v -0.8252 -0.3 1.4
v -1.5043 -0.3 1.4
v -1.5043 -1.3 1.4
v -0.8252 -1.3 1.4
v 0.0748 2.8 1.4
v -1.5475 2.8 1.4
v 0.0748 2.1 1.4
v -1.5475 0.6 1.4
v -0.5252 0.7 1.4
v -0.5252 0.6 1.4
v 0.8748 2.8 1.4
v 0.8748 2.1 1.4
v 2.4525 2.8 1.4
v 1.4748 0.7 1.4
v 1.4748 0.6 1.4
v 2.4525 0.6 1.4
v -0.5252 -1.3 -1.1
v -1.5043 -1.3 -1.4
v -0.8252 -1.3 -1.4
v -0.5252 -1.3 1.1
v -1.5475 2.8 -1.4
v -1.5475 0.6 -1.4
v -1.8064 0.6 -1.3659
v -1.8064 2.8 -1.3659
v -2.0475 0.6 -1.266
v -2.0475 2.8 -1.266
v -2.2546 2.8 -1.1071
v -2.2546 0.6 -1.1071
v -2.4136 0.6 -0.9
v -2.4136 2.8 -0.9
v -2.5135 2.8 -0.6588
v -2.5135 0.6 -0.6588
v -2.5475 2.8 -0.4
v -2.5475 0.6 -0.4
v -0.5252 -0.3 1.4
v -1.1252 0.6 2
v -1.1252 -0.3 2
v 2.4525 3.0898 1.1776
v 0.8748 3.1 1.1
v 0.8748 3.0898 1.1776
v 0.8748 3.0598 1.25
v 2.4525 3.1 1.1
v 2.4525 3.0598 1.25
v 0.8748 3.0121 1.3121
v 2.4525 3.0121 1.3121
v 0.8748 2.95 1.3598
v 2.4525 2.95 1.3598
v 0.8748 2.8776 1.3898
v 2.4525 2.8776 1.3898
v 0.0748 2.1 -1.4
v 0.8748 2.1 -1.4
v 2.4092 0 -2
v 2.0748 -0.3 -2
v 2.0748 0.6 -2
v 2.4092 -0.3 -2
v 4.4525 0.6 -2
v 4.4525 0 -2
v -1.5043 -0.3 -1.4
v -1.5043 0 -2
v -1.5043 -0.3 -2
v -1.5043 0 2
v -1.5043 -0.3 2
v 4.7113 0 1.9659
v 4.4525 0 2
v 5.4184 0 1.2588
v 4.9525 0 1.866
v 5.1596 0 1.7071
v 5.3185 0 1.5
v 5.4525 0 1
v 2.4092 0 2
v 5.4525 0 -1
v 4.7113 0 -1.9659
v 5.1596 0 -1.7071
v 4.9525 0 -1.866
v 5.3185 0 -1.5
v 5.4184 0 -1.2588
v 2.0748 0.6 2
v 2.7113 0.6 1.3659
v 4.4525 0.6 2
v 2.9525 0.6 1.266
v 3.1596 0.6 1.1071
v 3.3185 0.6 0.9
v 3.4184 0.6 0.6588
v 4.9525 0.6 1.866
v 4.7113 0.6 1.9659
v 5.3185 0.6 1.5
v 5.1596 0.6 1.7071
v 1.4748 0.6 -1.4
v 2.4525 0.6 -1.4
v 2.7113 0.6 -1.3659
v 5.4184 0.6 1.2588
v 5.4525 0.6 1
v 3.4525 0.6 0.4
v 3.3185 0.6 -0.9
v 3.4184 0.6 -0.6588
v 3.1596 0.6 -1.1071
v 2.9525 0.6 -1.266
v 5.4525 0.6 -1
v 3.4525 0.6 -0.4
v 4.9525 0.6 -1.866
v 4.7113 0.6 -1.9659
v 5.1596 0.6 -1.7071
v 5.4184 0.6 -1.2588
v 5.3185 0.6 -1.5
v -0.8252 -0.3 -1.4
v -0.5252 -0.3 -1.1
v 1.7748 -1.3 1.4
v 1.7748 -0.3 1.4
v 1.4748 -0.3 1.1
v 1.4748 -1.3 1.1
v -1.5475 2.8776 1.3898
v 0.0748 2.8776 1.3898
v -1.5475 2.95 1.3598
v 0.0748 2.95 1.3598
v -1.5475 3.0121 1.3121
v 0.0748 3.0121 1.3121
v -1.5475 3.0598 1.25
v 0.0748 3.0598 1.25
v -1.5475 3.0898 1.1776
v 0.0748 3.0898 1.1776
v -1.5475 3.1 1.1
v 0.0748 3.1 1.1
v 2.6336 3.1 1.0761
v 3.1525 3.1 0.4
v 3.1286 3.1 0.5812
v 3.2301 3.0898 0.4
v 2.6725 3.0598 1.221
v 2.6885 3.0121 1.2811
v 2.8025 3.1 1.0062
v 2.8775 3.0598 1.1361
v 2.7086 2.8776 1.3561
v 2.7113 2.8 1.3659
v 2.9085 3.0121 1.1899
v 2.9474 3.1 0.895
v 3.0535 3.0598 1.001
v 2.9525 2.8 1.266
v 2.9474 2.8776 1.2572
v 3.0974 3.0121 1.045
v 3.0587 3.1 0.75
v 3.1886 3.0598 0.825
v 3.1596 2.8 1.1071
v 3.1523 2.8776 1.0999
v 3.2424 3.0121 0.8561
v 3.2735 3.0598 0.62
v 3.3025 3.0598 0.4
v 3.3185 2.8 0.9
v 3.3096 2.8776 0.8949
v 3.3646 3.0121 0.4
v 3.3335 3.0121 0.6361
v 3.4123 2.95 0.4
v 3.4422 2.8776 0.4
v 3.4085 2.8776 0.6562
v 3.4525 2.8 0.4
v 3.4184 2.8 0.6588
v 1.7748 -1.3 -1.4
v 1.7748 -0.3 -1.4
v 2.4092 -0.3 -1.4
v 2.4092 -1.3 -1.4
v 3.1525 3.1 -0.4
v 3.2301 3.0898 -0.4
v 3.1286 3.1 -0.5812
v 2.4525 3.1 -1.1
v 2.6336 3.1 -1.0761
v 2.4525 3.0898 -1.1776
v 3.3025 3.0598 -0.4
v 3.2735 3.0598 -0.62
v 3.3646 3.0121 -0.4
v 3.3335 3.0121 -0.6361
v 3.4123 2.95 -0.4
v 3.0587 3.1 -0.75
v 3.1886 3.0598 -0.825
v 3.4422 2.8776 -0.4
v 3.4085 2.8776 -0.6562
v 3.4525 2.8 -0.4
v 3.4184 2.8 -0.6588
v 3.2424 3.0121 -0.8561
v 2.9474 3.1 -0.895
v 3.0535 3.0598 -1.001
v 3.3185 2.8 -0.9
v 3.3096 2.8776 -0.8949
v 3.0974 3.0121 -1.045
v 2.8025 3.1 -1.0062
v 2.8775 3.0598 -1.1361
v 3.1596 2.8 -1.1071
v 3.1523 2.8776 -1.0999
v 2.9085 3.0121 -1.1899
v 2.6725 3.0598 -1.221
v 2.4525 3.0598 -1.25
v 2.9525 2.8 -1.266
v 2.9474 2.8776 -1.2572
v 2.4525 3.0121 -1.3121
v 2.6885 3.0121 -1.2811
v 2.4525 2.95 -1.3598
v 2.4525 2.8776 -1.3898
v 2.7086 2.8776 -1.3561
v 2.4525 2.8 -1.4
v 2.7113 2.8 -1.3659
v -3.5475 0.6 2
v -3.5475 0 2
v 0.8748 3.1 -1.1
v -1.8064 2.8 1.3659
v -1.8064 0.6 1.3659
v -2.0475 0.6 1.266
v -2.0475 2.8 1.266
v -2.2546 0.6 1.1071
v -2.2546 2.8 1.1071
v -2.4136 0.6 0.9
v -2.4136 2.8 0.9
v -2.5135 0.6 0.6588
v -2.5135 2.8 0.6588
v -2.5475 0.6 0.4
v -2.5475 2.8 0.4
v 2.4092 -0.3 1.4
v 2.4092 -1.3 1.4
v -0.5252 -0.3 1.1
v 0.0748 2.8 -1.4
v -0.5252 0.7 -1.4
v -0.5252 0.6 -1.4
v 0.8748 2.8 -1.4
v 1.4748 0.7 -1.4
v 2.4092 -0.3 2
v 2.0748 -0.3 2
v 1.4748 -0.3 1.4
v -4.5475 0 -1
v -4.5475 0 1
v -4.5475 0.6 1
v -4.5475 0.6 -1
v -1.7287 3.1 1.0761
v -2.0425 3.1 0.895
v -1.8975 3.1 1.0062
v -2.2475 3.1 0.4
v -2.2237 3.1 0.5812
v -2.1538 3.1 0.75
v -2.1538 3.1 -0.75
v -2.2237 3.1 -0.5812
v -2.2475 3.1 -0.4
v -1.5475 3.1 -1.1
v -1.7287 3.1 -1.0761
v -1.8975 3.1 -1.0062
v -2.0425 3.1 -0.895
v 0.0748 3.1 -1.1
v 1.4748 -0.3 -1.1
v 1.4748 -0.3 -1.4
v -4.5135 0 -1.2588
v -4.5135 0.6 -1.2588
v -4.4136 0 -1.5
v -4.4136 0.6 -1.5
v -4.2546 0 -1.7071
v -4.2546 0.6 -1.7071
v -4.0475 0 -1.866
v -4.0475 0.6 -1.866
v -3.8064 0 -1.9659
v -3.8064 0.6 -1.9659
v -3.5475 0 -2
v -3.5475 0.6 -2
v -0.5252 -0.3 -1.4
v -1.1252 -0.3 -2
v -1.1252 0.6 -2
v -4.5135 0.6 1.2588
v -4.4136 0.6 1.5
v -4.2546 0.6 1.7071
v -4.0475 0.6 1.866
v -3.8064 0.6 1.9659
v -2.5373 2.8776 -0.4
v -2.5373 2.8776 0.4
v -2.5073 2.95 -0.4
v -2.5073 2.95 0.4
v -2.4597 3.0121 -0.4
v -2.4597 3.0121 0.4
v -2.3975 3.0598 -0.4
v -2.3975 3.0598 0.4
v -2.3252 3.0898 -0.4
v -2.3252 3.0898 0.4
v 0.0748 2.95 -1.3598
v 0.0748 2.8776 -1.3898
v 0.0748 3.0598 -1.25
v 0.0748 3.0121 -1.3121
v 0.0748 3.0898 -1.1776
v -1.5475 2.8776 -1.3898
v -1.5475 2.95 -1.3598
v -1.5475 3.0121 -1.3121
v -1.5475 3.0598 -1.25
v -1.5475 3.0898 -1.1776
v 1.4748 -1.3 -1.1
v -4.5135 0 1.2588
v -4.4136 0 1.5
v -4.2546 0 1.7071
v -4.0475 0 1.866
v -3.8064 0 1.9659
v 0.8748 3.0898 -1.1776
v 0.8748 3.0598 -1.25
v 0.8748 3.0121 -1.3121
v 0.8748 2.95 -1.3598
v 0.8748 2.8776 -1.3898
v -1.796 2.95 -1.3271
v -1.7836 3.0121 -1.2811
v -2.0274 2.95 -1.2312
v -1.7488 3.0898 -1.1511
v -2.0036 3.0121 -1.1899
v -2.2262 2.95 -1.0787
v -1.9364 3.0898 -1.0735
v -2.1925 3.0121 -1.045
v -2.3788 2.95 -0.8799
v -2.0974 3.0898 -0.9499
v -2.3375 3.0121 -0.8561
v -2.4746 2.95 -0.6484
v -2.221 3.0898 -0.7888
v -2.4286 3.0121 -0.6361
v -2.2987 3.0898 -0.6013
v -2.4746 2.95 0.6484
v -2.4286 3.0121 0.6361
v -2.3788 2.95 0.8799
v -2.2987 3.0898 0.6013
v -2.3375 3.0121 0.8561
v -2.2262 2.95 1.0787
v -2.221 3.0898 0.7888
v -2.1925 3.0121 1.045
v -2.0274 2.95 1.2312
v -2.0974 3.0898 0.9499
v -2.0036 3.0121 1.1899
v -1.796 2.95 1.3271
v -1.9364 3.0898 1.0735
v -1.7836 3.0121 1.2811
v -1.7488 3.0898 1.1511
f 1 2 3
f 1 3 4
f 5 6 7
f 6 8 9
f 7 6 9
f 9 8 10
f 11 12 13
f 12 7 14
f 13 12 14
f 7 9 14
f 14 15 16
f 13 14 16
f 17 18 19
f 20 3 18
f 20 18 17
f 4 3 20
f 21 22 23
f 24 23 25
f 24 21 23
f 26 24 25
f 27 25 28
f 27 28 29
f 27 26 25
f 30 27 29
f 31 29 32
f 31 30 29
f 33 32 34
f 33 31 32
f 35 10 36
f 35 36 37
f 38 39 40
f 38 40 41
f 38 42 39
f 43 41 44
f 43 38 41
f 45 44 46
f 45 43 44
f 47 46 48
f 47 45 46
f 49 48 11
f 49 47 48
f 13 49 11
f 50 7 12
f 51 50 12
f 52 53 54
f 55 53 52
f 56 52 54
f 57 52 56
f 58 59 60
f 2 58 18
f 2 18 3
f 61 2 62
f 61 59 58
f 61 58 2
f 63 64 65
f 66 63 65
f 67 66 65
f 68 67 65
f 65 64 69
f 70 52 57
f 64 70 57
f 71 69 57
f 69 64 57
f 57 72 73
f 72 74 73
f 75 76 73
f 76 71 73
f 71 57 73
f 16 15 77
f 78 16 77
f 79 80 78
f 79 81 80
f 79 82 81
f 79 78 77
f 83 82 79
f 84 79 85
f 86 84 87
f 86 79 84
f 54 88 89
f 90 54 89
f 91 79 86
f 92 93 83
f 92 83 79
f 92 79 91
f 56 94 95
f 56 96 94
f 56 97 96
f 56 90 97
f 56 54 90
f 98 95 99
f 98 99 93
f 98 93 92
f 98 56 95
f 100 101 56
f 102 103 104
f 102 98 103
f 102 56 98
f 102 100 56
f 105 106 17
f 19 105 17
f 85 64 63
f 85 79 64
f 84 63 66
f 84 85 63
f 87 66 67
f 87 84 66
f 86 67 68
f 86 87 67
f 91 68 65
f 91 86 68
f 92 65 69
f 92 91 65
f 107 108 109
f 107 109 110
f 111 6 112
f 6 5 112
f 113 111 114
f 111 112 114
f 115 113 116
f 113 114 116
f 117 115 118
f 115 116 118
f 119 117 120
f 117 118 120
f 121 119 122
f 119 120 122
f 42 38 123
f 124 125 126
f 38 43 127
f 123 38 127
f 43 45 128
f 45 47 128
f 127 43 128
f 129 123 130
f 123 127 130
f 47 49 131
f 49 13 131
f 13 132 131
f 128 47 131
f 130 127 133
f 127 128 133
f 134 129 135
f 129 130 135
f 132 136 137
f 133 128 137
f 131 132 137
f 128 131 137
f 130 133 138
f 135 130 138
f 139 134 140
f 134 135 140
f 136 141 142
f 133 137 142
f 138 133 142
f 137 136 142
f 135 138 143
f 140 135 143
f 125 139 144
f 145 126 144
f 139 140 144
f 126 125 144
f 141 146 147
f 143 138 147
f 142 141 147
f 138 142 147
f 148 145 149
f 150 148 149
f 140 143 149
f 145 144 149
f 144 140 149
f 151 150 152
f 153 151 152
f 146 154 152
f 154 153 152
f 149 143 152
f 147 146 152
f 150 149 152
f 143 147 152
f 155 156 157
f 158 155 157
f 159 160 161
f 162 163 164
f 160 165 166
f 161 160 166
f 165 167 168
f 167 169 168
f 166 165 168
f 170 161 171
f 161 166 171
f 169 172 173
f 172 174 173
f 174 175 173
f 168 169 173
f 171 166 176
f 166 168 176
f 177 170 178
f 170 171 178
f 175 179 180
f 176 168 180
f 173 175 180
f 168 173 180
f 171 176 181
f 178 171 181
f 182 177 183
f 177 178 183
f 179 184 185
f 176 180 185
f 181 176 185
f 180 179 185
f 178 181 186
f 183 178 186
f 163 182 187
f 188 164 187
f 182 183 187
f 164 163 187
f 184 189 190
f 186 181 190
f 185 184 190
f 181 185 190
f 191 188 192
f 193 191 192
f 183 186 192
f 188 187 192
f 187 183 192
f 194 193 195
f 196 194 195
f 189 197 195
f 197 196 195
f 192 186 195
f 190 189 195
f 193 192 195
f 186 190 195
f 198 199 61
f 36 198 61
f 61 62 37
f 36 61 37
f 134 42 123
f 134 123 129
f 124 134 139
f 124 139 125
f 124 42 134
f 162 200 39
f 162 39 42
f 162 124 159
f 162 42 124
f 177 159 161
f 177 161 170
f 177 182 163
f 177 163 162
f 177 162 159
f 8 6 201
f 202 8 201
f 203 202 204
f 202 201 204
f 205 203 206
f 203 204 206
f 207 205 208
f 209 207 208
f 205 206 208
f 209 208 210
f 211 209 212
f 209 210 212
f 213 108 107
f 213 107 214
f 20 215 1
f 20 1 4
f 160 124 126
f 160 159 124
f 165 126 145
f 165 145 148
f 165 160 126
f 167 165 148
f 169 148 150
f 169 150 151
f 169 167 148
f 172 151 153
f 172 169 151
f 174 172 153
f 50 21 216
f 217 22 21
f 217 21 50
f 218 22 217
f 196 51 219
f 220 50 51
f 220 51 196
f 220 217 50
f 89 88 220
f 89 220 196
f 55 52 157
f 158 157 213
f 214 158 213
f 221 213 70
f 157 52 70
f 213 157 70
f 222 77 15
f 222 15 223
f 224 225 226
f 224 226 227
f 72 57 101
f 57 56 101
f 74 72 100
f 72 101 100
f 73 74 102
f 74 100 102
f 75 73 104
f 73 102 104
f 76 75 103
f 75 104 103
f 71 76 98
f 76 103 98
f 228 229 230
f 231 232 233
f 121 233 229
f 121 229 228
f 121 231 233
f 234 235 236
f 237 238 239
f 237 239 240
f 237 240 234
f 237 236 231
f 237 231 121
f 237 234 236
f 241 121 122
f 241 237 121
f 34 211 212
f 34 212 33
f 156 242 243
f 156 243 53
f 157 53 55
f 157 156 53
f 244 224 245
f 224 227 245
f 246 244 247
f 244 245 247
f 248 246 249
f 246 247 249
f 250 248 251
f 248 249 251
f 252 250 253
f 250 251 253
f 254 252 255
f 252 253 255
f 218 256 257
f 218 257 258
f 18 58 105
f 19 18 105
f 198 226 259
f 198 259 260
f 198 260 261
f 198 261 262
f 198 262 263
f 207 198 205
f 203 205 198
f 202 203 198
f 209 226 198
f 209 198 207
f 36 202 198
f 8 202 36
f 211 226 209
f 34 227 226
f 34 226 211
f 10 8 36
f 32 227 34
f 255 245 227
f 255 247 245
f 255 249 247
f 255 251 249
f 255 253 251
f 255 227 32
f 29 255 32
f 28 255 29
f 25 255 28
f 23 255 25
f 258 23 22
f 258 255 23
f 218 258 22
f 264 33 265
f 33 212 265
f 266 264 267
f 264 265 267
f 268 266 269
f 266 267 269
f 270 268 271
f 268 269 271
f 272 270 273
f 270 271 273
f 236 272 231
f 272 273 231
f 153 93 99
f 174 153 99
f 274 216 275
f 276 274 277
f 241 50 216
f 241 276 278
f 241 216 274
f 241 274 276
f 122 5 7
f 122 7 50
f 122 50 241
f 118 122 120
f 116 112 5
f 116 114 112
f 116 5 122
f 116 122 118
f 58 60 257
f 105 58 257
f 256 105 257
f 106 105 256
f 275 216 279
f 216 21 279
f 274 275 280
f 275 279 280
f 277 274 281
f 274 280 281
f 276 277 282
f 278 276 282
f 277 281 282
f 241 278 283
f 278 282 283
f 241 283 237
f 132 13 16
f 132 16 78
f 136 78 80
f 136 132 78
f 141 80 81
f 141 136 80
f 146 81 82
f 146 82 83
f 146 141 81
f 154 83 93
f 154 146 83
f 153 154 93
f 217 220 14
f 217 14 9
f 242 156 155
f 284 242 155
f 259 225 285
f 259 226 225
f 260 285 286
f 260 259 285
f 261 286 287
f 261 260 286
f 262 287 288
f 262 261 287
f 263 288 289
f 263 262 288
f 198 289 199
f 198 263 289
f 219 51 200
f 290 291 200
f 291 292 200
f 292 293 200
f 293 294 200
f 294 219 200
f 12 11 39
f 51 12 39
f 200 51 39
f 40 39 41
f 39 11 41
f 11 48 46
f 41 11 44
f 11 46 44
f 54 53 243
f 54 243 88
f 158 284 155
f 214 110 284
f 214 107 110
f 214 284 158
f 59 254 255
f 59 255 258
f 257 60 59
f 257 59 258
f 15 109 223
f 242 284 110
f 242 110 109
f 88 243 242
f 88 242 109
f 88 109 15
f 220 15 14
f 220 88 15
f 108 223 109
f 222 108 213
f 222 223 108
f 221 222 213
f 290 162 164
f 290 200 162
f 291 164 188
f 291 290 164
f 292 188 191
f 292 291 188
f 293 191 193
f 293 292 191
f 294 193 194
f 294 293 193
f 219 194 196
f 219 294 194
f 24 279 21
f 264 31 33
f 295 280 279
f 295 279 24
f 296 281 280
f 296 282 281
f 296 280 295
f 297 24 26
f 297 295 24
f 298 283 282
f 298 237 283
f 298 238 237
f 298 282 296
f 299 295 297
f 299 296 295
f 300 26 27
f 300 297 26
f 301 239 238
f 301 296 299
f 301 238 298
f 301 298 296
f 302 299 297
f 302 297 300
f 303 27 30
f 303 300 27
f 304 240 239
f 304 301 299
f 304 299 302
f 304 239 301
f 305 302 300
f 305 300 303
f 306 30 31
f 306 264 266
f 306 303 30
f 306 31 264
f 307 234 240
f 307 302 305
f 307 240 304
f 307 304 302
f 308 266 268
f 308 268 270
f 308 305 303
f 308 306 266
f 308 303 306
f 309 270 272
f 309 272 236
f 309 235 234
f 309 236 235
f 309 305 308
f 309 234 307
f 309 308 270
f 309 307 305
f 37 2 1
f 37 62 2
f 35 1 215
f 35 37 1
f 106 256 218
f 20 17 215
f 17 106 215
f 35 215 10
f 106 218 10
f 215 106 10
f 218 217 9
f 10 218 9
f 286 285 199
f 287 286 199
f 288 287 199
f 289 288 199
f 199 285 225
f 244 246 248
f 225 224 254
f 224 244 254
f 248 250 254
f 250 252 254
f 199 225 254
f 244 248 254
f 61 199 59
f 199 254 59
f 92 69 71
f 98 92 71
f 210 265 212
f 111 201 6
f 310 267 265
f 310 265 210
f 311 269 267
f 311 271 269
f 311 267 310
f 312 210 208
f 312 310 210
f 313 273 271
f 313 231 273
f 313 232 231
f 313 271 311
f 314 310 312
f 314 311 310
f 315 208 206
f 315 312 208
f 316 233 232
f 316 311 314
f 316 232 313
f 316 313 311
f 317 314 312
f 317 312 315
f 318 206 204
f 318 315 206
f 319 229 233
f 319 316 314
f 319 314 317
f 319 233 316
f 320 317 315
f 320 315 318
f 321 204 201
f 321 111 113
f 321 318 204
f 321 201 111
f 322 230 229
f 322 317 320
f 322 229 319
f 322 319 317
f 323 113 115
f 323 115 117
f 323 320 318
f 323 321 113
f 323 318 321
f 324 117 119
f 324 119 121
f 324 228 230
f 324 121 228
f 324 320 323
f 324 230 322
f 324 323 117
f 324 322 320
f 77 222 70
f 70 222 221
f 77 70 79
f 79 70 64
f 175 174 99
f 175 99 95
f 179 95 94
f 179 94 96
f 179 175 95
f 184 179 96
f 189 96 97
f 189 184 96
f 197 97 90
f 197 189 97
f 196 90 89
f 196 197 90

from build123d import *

# Parameters (mm, degrees)
SKETCH_1_W                      = 10
SKETCH_1_H                      = 4
EXTRUDE_1_DEPTH                 = 0.6
SKETCH_2_W                      = 6
SKETCH_2_H                      = 2.8
EXTRUDE_2_DEPTH                 = 2.5
FILLET_1_R                      = 1
CUT_EXTRUDE_2_REACH             = 9.134
SKETCH_7_W                      = 0.8
SKETCH_7_H                      = 1
CUT_EXTRUDE_2_DIRECTION_2_DEPTH = 8.134379197
SKETCH_8_W                      = 3.913502977
SKETCH_8_H                      = 4
EXTRUDE_3_DEPTH                 = 0.3
CUT_EXTRUDE_3_REACH             = 9.439
SKETCH_9_W                      = 2
SKETCH_9_H                      = 1
CHAMFER_2_SIZE                  = 0.6
FILLET_2_R                      = 0.3
SKETCH_10_W                     = 0.979037501
SKETCH_10_H                     = 2.8
SKETCH_10_W_2                   = 0.934465476
EXTRUDE_4_DEPTH                 = 1
CHAMFER_3_SIZE                  = 0.3


with BuildPart() as part:
    # 草图1 → 凸台-拉伸1 (new body)
    with BuildSketch(Plane(origin=(0, 0, 0), x_dir=(1, 0, 0), z_dir=(0, 1, 0))):
        with Locations((0.452464262, 0)):
            Rectangle(SKETCH_1_W, SKETCH_1_H)
    extrude(amount=EXTRUDE_1_DEPTH)

    # 草图2 → 凸台-拉伸2 (add)
    with BuildSketch(Plane(origin=(0, 0.6, 0), x_dir=(1, 0, 0), z_dir=(0, 1, 0))):
        with Locations((0.452464262, 0)):
            Rectangle(SKETCH_2_W, SKETCH_2_H)
    extrude(amount=EXTRUDE_2_DEPTH)

    # 圆角1
    fillet_1_edges = [part.edges().sort_by_distance(p)[0] for p in [
        (3.452464262, 1.85, 1.4),
        (3.452464262, 1.85, -1.4),
        (-2.547535738, 1.85, -1.4),
        (-2.547535738, 1.85, 1.4),
        (5.452464262, 0.3, 2),
        (-4.547535738, 0.3, 2),
        (-4.547535738, 0.3, -2),
        (5.452464262, 0.3, -2),
    ]]
    fillet(fillet_1_edges, radius=FILLET_1_R)

    # 草图7 → 切除-拉伸2 (cut, up to next)
    with BuildSketch(Plane.XY.offset(1.4), mode=Mode.PRIVATE) as cut_extrude_2_sk1:
        with Locations((0.474750274, 2.6)):
            Rectangle(SKETCH_7_W, SKETCH_7_H)
    cut_extrude_2_tool1 = extrude(cut_extrude_2_sk1.sketch, amount=-CUT_EXTRUDE_2_REACH, mode=Mode.PRIVATE) & part.part
    add(cut_extrude_2_tool1.solids().sort_by_distance((0.47475, 2.6, 1.4))[0], mode=Mode.SUBTRACT)

    # 草图7 → 切除-拉伸2 direction 2 (cut)
    with BuildSketch(Plane.XY.offset(1.4)):
        with Locations((0.474750274, 2.6)):
            Rectangle(SKETCH_7_W, SKETCH_7_H)
    extrude(amount=CUT_EXTRUDE_2_DIRECTION_2_DEPTH, mode=Mode.SUBTRACT)

    # 草图8 → 凸台-拉伸3 (add)
    with BuildSketch(Plane.XZ):
        with Locations((0.452464261, 0)):
            Rectangle(SKETCH_8_W, SKETCH_8_H)
    extrude(amount=EXTRUDE_3_DEPTH)

    # 草图9 → 切除-拉伸3 (cut, up to next)
    with BuildSketch(Plane(origin=(0, 0, -2), x_dir=(-1, 0, 0), z_dir=(0, 0, -1)), mode=Mode.PRIVATE) as cut_extrude_3_sk1:
        with Locations((-0.474750274, 0.2)):
            Rectangle(SKETCH_9_W, SKETCH_9_H)
    cut_extrude_3_tool1 = extrude(cut_extrude_3_sk1.sketch, amount=-CUT_EXTRUDE_3_REACH, mode=Mode.PRIVATE) & part.part
    add(cut_extrude_3_tool1.solids().sort_by_distance((0.47475, 0.2, -2))[0], mode=Mode.SUBTRACT)

    # 倒角2
    chamfer_2_edges = [part.edges().sort_by_distance(p)[0] for p in [
        (-0.525249726, 0.15, 2),
        (-0.525249726, 0.15, -2),
        (1.474750274, 0.15, -2),
        (1.474750274, 0.15, 2),
    ]]
    chamfer(chamfer_2_edges, length=CHAMFER_2_SIZE)

    # 圆角2
    fillet_2_edges = [part.edges().sort_by_distance(p)[0] for p in [
        (-0.736392732, 3.1, 1.4),
        (-2.547535738, 3.1, 0),
        (3.452464262, 3.1, 0),
        (1.663607268, 3.1, -1.4),
        (3.159571043, 3.1, -1.107106781),
        (-2.25464252, 3.1, -1.107106781),
        (3.159571043, 3.1, 1.107106781),
        (-2.25464252, 3.1, 1.107106781),
        (1.663607268, 3.1, 1.4),
        (-0.736392732, 3.1, -1.4),
    ]]
    fillet(fillet_2_edges, radius=FILLET_2_R)

    # 草图10 → 凸台-拉伸4 (add)
    with BuildSketch(Plane.XZ.offset(0.3)):
        with Locations((-1.014768477, 0)):
            Rectangle(SKETCH_10_W, SKETCH_10_H)
        with Locations((1.941983012, 0)):
            Rectangle(SKETCH_10_W_2, SKETCH_10_H)
    extrude(amount=EXTRUDE_4_DEPTH)

    # 倒角3
    chamfer_3_edges = [part.edges().sort_by_distance(p)[0] for p in [
        (-0.525249726, -0.8, -1.4),
        (-0.525249726, -0.8, 1.4),
        (1.474750274, -0.8, 1.4),
        (1.474750274, -0.8, -1.4),
    ]]
    chamfer(chamfer_3_edges, length=CHAMFER_3_SIZE)


solid = part.part
